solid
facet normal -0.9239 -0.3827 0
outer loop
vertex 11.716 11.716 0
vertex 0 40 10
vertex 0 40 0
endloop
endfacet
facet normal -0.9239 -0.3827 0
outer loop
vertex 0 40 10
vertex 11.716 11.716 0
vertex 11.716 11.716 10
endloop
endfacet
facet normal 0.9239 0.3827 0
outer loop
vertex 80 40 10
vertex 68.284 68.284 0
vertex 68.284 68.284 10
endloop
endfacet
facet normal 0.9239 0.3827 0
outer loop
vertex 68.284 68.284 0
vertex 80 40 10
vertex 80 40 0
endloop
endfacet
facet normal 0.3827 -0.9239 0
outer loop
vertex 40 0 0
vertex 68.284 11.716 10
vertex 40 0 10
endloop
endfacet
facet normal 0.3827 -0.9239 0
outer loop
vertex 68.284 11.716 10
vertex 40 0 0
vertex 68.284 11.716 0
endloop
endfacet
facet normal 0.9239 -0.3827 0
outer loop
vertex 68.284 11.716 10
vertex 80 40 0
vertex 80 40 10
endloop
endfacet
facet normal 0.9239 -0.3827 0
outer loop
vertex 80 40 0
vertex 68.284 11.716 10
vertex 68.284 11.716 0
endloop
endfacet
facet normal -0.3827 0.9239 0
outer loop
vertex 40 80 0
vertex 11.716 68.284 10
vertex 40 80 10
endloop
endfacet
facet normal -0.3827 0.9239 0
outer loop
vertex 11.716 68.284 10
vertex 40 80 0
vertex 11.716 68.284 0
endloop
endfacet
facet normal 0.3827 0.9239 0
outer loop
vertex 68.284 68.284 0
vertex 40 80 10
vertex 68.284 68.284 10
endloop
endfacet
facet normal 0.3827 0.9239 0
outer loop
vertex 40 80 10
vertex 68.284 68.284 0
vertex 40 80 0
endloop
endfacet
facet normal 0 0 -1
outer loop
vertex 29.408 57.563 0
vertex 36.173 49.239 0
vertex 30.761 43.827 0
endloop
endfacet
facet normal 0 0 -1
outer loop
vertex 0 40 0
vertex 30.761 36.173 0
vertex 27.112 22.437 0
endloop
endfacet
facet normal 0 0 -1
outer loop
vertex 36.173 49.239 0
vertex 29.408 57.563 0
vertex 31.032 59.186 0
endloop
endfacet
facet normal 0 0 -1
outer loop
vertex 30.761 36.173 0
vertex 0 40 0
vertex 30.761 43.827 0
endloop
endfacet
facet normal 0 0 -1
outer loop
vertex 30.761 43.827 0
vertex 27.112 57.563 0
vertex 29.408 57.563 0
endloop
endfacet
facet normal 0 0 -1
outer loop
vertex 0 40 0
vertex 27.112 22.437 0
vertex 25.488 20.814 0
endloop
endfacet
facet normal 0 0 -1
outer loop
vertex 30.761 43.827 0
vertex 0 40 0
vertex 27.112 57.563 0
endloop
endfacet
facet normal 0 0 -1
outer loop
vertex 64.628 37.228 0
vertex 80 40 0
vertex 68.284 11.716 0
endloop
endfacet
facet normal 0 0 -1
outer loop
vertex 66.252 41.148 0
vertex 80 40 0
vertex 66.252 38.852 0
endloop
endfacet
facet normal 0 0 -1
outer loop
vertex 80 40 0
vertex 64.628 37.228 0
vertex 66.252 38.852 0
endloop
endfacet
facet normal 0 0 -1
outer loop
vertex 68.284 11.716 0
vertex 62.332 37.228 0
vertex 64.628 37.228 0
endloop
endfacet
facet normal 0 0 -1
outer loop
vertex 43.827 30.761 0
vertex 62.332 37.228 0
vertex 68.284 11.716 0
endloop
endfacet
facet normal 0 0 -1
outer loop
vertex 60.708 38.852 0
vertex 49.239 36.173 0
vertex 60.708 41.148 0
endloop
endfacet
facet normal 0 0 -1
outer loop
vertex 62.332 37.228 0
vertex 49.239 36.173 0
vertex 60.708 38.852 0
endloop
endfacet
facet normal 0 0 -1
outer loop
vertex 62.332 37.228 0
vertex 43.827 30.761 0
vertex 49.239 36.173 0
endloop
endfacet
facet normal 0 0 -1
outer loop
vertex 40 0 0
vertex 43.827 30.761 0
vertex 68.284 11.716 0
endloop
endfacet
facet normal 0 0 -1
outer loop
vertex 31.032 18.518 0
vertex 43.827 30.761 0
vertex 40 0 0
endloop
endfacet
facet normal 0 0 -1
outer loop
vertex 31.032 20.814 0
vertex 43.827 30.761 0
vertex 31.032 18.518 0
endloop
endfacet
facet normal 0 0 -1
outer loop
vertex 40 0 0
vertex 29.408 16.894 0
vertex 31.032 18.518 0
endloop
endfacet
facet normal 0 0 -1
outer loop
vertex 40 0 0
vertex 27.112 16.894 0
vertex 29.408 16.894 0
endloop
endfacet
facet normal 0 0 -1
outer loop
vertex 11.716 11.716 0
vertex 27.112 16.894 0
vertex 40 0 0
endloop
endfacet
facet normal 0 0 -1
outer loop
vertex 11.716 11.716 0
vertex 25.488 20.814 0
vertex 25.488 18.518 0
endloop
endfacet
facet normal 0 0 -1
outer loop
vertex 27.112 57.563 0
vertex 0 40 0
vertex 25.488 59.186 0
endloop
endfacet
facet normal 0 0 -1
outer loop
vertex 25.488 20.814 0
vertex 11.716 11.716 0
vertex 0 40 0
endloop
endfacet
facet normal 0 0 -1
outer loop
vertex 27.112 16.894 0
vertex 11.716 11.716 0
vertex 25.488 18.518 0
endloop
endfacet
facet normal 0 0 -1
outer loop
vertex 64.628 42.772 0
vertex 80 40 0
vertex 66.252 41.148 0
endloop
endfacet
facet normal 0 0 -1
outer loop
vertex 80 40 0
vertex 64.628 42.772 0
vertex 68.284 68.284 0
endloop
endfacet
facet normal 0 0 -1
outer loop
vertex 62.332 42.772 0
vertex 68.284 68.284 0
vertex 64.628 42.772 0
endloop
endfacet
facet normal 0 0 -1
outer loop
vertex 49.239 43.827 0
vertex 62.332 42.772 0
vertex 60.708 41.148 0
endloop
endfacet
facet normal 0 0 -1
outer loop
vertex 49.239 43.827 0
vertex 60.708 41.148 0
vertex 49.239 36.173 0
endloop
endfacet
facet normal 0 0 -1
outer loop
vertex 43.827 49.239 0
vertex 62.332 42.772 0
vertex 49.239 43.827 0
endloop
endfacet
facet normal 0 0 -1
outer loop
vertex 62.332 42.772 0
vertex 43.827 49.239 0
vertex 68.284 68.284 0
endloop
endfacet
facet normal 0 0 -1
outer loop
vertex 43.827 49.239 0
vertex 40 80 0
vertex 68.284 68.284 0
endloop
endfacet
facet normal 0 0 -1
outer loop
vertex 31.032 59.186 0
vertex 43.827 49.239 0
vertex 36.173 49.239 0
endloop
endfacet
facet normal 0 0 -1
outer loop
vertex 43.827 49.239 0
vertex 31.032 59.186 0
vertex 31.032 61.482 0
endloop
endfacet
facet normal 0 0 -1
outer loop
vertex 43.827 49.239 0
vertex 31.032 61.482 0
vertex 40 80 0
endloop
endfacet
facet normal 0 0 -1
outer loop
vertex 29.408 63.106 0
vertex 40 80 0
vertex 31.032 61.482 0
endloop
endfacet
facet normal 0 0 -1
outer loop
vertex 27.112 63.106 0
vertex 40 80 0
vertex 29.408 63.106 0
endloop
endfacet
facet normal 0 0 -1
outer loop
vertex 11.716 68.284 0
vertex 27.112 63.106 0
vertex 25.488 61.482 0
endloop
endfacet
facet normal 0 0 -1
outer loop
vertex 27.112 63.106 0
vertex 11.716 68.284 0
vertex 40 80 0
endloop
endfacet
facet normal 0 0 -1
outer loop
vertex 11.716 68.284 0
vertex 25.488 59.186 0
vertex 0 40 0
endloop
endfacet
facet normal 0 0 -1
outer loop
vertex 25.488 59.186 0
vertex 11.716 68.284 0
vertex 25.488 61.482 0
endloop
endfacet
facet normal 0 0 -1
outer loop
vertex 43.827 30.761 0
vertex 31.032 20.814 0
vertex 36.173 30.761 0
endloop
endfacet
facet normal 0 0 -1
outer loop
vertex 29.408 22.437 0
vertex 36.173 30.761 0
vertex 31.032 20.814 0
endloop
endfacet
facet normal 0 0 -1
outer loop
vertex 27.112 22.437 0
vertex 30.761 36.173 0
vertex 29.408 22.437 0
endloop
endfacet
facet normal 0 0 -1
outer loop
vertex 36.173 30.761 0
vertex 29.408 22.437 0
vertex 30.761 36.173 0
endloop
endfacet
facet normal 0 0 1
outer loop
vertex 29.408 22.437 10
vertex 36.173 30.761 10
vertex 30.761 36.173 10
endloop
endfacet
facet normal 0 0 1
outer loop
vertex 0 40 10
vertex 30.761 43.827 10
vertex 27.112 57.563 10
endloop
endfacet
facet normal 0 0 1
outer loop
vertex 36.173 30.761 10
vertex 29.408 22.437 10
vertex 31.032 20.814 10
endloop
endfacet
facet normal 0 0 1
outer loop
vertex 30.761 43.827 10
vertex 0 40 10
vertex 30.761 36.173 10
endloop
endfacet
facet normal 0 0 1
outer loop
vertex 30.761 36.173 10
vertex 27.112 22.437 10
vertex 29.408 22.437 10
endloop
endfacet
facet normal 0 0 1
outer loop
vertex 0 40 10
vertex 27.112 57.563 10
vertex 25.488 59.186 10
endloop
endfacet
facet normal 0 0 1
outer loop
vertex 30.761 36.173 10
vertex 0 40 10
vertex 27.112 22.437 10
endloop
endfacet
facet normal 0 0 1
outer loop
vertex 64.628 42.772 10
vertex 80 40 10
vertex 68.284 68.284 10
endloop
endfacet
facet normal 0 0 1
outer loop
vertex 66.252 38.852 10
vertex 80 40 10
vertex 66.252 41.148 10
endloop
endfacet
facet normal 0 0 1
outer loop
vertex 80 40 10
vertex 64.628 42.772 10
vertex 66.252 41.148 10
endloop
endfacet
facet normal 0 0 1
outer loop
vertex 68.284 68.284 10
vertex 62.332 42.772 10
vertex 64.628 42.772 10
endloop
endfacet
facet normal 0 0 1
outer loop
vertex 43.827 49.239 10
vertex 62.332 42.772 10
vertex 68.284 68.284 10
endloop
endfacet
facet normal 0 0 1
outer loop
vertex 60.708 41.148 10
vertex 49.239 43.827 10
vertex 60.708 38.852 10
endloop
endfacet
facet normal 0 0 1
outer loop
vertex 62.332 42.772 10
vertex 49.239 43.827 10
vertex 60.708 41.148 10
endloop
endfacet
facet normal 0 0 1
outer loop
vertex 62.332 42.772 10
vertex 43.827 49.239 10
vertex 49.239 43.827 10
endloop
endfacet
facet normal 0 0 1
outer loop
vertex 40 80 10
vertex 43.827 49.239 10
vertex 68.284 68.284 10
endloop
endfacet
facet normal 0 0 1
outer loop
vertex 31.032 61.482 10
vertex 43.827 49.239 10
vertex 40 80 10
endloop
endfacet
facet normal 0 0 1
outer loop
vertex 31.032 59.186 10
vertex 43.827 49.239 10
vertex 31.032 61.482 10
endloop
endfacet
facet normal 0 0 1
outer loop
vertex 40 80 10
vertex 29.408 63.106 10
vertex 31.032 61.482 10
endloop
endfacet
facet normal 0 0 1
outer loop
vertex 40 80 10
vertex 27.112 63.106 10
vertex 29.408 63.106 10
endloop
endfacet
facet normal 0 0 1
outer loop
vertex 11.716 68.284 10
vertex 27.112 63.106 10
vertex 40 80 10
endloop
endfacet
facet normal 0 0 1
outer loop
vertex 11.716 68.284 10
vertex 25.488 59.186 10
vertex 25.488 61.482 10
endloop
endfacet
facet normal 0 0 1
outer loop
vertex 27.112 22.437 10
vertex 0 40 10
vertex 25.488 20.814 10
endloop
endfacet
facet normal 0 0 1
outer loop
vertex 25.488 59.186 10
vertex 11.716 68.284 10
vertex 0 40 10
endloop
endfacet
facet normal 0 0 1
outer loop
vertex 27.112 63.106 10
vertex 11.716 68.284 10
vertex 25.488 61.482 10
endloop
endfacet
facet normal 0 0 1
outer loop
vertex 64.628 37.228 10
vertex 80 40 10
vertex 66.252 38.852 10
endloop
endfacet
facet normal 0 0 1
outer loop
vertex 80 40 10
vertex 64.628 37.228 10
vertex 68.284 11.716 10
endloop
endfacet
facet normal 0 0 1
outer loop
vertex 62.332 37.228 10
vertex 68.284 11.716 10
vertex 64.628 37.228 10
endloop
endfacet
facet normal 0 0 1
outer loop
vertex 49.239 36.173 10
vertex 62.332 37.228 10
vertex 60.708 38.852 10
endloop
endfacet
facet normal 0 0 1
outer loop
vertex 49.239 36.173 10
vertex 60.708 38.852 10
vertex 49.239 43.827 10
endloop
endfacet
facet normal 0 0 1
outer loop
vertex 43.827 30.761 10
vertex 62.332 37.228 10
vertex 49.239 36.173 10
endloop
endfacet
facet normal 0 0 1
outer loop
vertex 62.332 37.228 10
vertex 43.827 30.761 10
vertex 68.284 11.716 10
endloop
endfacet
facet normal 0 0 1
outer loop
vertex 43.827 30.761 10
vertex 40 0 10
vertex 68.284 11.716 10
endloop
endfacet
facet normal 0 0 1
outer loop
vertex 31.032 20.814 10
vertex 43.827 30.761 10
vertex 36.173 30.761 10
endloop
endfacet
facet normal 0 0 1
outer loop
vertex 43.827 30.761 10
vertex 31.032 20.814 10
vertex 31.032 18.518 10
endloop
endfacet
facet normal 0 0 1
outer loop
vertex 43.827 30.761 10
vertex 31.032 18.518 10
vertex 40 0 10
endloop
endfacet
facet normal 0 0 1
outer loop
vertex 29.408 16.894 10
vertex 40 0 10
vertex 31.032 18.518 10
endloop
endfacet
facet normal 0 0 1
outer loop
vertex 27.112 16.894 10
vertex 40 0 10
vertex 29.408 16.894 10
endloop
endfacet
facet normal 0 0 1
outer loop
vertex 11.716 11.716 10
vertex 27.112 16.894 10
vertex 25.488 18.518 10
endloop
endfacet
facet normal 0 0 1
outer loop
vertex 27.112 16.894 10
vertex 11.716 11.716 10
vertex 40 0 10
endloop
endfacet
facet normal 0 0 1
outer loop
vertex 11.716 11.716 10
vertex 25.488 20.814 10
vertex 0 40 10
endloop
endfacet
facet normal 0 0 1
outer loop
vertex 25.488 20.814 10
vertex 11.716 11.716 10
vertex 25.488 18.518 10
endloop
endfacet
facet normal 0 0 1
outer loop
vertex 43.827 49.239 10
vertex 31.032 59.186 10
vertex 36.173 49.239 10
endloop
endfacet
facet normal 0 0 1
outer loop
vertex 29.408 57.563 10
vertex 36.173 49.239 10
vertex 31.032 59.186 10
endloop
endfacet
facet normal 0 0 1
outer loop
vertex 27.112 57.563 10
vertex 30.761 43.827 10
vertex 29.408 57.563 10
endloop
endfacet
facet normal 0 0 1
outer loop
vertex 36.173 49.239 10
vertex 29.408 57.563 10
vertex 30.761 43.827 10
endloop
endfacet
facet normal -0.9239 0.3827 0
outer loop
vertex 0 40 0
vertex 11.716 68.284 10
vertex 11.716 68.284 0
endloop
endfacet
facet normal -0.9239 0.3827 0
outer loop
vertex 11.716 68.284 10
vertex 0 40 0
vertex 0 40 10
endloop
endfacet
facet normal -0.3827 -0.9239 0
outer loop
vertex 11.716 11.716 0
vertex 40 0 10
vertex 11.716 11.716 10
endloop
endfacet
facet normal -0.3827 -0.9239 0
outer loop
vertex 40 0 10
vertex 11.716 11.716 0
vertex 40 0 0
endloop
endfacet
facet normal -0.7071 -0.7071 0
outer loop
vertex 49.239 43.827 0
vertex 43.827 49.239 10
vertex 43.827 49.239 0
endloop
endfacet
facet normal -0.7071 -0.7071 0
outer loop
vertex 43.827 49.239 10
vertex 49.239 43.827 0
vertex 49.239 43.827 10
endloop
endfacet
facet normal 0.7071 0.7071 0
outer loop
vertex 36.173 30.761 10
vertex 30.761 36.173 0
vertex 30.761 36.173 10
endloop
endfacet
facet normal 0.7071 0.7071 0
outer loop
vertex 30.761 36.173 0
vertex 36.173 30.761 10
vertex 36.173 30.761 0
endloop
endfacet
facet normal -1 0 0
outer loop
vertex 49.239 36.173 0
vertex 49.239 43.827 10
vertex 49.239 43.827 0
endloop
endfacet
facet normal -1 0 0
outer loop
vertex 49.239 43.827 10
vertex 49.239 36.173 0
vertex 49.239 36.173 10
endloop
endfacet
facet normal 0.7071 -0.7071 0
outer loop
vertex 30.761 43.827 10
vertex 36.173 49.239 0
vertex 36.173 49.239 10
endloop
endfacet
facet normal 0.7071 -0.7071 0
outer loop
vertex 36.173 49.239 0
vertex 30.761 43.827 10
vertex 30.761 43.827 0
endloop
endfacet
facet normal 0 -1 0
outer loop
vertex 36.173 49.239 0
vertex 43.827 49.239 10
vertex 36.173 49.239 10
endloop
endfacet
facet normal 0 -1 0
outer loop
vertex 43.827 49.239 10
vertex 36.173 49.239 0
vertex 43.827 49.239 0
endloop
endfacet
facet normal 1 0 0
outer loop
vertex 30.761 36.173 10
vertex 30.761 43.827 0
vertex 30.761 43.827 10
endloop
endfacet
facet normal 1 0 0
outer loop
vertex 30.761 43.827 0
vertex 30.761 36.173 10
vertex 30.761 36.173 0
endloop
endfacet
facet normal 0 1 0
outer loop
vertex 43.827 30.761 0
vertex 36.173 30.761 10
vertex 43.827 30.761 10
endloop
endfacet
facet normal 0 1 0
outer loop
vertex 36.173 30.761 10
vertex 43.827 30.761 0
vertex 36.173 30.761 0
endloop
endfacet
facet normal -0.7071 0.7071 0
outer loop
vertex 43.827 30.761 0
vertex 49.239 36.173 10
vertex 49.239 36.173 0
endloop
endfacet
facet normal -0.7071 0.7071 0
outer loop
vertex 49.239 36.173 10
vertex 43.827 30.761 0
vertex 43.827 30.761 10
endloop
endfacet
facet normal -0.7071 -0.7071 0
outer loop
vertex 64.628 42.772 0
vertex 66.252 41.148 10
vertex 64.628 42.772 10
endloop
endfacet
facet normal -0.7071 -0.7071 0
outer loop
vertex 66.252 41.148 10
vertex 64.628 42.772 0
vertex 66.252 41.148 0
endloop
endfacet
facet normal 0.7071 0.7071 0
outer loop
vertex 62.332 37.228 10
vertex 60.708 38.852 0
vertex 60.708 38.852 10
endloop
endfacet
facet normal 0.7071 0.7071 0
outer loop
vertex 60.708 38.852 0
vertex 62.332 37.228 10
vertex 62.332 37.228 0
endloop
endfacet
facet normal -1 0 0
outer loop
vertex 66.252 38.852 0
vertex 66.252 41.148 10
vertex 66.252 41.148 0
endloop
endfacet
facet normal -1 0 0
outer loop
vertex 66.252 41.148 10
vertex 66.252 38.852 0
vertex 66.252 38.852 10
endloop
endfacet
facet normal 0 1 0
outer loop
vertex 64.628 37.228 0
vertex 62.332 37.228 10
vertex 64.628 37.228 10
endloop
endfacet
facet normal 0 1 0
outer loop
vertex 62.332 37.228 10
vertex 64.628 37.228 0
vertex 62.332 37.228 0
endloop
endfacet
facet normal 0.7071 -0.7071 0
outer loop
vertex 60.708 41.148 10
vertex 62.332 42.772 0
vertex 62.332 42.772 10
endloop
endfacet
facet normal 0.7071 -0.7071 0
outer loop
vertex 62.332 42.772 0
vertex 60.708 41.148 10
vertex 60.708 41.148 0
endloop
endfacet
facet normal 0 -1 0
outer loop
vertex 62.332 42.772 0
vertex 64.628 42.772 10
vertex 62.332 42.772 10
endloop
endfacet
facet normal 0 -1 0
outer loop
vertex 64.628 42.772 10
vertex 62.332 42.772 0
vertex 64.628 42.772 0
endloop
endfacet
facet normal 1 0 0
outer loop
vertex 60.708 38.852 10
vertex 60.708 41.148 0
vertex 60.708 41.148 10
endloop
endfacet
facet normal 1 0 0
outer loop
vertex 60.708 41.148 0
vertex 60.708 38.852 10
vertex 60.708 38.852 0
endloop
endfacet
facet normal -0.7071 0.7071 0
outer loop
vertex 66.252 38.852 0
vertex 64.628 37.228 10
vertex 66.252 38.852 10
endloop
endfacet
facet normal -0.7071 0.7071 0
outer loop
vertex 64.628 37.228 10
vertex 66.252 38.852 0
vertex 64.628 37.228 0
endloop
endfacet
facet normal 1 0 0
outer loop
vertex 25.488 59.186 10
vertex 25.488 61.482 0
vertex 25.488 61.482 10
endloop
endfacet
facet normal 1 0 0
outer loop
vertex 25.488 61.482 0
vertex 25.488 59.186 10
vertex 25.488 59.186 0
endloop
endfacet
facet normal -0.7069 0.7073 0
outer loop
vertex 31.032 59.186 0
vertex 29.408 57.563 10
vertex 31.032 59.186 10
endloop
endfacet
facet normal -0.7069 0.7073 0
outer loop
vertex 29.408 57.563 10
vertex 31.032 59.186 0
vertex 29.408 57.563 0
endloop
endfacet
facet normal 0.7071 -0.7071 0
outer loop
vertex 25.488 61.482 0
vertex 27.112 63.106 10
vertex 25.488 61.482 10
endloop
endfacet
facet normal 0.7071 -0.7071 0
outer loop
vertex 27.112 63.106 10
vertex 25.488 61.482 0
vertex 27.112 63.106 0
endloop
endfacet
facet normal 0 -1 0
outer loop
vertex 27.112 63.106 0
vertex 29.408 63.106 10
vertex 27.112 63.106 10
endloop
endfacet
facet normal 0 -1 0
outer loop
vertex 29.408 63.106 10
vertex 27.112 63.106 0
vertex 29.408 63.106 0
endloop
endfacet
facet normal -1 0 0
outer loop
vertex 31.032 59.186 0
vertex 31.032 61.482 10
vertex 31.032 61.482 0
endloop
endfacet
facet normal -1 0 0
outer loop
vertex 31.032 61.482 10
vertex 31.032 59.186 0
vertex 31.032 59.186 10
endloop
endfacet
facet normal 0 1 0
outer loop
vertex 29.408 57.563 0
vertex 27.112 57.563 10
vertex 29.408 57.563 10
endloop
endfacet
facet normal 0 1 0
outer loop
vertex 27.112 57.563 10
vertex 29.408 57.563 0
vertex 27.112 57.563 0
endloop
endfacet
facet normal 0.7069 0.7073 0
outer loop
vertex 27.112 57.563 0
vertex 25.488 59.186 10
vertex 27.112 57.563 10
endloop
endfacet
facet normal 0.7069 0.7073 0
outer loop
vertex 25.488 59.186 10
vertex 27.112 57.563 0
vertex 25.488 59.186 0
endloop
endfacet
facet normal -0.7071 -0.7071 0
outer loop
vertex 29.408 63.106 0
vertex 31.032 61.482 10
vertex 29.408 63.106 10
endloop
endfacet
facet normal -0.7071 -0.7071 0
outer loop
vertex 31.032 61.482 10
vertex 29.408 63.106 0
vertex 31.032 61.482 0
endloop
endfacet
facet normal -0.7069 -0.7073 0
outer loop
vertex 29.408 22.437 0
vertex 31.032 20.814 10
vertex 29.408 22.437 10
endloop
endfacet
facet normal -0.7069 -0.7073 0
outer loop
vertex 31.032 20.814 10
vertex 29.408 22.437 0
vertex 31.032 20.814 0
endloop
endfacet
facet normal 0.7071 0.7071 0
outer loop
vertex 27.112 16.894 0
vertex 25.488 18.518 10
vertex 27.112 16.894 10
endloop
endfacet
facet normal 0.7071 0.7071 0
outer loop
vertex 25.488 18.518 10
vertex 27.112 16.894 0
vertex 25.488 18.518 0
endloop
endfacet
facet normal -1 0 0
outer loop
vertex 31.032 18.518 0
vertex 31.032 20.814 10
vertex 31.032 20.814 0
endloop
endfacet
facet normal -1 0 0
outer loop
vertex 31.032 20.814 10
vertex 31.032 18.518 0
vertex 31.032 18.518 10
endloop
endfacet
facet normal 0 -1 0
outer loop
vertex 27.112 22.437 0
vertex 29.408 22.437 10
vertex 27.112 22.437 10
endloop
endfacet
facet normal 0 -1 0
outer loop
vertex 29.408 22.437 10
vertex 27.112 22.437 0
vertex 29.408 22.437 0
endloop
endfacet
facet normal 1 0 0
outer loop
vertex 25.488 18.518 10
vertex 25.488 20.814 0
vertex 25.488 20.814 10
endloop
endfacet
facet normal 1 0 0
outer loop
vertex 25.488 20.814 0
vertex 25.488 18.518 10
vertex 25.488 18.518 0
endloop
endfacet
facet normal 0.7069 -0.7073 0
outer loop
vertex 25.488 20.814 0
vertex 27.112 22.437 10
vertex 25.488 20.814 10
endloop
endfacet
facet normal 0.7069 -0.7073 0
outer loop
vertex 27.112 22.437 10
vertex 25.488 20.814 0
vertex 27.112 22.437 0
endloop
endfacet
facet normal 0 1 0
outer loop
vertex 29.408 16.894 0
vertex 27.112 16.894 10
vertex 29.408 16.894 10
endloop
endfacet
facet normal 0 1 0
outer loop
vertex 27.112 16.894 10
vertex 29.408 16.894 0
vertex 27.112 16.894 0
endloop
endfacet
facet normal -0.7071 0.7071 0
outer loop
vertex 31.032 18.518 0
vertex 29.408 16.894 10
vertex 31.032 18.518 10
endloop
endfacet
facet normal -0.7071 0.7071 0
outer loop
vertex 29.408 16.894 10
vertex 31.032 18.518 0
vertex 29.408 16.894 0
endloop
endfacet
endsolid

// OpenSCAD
$fn = 32;

// ----------------------------------------------------------------------
// Polygon plate: 8-gon R40, 3 bolt windows
// ----------------------------------------------------------------------

// --- parameters (mm) ---
sides = 8;                // number of polygon sides
plate_r = 40;             // circumscribed radius of the polygon
bore_r = 10;              // centre bore radius
bolts = 3;                // number of bolt windows
ring_r = 23.48;           // bolt-circle radius
bolt_r = 3;               // bolt window radius
plate_t = 10;             // plate thickness, Z (extrusion height)

plate_d = 2 * plate_r;  // circumscribed diameter
bore_d = 2 * bore_r;  // centre bore diameter
bolt_d = 2 * bolt_r;  // bolt window diameter
ring_d = 2 * ring_r;  // bolt-circle diameter

profile = [[80, 40], [68.284, 68.284], [40, 80], [11.716, 68.284], [0, 40], [11.716, 11.716], [40, 0], [68.284, 11.716]];  // primary outline, 8 points, counter clockwise
void_1 = [[49.239, 43.827], [43.827, 49.239], [36.173, 49.239], [30.761, 43.827], [30.761, 36.173], [36.173, 30.761], [43.827, 30.761], [49.239, 36.173]];  // centre bore, 8 points
void_2 = [[66.252, 41.148], [64.628, 42.772], [62.332, 42.772], [60.708, 41.148], [60.708, 38.852], [62.332, 37.228], [64.628, 37.228], [66.252, 38.852]];  // bolt window 1, 8 points
void_3 = [[31.032, 61.482], [29.408, 63.106], [27.112, 63.106], [25.488, 61.482], [25.488, 59.186], [27.112, 57.563], [29.408, 57.563], [31.032, 59.186]];  // bolt window 2, 8 points
void_4 = [[31.032, 20.814], [29.408, 22.437], [27.112, 22.437], [25.488, 20.814], [25.488, 18.518], [27.112, 16.894], [29.408, 16.894], [31.032, 18.518]];  // bolt window 3, 8 points

// --- the one profile operation ---
difference() {
  linear_extrude(height = plate_t) polygon(points = profile);
  translate([0, 0, -1])
    linear_extrude(height = plate_t + 2) polygon(points = void_1);
  translate([0, 0, -1])
    linear_extrude(height = plate_t + 2) polygon(points = void_2);
  translate([0, 0, -1])
    linear_extrude(height = plate_t + 2) polygon(points = void_3);
  translate([0, 0, -1])
    linear_extrude(height = plate_t + 2) polygon(points = void_4);
}
